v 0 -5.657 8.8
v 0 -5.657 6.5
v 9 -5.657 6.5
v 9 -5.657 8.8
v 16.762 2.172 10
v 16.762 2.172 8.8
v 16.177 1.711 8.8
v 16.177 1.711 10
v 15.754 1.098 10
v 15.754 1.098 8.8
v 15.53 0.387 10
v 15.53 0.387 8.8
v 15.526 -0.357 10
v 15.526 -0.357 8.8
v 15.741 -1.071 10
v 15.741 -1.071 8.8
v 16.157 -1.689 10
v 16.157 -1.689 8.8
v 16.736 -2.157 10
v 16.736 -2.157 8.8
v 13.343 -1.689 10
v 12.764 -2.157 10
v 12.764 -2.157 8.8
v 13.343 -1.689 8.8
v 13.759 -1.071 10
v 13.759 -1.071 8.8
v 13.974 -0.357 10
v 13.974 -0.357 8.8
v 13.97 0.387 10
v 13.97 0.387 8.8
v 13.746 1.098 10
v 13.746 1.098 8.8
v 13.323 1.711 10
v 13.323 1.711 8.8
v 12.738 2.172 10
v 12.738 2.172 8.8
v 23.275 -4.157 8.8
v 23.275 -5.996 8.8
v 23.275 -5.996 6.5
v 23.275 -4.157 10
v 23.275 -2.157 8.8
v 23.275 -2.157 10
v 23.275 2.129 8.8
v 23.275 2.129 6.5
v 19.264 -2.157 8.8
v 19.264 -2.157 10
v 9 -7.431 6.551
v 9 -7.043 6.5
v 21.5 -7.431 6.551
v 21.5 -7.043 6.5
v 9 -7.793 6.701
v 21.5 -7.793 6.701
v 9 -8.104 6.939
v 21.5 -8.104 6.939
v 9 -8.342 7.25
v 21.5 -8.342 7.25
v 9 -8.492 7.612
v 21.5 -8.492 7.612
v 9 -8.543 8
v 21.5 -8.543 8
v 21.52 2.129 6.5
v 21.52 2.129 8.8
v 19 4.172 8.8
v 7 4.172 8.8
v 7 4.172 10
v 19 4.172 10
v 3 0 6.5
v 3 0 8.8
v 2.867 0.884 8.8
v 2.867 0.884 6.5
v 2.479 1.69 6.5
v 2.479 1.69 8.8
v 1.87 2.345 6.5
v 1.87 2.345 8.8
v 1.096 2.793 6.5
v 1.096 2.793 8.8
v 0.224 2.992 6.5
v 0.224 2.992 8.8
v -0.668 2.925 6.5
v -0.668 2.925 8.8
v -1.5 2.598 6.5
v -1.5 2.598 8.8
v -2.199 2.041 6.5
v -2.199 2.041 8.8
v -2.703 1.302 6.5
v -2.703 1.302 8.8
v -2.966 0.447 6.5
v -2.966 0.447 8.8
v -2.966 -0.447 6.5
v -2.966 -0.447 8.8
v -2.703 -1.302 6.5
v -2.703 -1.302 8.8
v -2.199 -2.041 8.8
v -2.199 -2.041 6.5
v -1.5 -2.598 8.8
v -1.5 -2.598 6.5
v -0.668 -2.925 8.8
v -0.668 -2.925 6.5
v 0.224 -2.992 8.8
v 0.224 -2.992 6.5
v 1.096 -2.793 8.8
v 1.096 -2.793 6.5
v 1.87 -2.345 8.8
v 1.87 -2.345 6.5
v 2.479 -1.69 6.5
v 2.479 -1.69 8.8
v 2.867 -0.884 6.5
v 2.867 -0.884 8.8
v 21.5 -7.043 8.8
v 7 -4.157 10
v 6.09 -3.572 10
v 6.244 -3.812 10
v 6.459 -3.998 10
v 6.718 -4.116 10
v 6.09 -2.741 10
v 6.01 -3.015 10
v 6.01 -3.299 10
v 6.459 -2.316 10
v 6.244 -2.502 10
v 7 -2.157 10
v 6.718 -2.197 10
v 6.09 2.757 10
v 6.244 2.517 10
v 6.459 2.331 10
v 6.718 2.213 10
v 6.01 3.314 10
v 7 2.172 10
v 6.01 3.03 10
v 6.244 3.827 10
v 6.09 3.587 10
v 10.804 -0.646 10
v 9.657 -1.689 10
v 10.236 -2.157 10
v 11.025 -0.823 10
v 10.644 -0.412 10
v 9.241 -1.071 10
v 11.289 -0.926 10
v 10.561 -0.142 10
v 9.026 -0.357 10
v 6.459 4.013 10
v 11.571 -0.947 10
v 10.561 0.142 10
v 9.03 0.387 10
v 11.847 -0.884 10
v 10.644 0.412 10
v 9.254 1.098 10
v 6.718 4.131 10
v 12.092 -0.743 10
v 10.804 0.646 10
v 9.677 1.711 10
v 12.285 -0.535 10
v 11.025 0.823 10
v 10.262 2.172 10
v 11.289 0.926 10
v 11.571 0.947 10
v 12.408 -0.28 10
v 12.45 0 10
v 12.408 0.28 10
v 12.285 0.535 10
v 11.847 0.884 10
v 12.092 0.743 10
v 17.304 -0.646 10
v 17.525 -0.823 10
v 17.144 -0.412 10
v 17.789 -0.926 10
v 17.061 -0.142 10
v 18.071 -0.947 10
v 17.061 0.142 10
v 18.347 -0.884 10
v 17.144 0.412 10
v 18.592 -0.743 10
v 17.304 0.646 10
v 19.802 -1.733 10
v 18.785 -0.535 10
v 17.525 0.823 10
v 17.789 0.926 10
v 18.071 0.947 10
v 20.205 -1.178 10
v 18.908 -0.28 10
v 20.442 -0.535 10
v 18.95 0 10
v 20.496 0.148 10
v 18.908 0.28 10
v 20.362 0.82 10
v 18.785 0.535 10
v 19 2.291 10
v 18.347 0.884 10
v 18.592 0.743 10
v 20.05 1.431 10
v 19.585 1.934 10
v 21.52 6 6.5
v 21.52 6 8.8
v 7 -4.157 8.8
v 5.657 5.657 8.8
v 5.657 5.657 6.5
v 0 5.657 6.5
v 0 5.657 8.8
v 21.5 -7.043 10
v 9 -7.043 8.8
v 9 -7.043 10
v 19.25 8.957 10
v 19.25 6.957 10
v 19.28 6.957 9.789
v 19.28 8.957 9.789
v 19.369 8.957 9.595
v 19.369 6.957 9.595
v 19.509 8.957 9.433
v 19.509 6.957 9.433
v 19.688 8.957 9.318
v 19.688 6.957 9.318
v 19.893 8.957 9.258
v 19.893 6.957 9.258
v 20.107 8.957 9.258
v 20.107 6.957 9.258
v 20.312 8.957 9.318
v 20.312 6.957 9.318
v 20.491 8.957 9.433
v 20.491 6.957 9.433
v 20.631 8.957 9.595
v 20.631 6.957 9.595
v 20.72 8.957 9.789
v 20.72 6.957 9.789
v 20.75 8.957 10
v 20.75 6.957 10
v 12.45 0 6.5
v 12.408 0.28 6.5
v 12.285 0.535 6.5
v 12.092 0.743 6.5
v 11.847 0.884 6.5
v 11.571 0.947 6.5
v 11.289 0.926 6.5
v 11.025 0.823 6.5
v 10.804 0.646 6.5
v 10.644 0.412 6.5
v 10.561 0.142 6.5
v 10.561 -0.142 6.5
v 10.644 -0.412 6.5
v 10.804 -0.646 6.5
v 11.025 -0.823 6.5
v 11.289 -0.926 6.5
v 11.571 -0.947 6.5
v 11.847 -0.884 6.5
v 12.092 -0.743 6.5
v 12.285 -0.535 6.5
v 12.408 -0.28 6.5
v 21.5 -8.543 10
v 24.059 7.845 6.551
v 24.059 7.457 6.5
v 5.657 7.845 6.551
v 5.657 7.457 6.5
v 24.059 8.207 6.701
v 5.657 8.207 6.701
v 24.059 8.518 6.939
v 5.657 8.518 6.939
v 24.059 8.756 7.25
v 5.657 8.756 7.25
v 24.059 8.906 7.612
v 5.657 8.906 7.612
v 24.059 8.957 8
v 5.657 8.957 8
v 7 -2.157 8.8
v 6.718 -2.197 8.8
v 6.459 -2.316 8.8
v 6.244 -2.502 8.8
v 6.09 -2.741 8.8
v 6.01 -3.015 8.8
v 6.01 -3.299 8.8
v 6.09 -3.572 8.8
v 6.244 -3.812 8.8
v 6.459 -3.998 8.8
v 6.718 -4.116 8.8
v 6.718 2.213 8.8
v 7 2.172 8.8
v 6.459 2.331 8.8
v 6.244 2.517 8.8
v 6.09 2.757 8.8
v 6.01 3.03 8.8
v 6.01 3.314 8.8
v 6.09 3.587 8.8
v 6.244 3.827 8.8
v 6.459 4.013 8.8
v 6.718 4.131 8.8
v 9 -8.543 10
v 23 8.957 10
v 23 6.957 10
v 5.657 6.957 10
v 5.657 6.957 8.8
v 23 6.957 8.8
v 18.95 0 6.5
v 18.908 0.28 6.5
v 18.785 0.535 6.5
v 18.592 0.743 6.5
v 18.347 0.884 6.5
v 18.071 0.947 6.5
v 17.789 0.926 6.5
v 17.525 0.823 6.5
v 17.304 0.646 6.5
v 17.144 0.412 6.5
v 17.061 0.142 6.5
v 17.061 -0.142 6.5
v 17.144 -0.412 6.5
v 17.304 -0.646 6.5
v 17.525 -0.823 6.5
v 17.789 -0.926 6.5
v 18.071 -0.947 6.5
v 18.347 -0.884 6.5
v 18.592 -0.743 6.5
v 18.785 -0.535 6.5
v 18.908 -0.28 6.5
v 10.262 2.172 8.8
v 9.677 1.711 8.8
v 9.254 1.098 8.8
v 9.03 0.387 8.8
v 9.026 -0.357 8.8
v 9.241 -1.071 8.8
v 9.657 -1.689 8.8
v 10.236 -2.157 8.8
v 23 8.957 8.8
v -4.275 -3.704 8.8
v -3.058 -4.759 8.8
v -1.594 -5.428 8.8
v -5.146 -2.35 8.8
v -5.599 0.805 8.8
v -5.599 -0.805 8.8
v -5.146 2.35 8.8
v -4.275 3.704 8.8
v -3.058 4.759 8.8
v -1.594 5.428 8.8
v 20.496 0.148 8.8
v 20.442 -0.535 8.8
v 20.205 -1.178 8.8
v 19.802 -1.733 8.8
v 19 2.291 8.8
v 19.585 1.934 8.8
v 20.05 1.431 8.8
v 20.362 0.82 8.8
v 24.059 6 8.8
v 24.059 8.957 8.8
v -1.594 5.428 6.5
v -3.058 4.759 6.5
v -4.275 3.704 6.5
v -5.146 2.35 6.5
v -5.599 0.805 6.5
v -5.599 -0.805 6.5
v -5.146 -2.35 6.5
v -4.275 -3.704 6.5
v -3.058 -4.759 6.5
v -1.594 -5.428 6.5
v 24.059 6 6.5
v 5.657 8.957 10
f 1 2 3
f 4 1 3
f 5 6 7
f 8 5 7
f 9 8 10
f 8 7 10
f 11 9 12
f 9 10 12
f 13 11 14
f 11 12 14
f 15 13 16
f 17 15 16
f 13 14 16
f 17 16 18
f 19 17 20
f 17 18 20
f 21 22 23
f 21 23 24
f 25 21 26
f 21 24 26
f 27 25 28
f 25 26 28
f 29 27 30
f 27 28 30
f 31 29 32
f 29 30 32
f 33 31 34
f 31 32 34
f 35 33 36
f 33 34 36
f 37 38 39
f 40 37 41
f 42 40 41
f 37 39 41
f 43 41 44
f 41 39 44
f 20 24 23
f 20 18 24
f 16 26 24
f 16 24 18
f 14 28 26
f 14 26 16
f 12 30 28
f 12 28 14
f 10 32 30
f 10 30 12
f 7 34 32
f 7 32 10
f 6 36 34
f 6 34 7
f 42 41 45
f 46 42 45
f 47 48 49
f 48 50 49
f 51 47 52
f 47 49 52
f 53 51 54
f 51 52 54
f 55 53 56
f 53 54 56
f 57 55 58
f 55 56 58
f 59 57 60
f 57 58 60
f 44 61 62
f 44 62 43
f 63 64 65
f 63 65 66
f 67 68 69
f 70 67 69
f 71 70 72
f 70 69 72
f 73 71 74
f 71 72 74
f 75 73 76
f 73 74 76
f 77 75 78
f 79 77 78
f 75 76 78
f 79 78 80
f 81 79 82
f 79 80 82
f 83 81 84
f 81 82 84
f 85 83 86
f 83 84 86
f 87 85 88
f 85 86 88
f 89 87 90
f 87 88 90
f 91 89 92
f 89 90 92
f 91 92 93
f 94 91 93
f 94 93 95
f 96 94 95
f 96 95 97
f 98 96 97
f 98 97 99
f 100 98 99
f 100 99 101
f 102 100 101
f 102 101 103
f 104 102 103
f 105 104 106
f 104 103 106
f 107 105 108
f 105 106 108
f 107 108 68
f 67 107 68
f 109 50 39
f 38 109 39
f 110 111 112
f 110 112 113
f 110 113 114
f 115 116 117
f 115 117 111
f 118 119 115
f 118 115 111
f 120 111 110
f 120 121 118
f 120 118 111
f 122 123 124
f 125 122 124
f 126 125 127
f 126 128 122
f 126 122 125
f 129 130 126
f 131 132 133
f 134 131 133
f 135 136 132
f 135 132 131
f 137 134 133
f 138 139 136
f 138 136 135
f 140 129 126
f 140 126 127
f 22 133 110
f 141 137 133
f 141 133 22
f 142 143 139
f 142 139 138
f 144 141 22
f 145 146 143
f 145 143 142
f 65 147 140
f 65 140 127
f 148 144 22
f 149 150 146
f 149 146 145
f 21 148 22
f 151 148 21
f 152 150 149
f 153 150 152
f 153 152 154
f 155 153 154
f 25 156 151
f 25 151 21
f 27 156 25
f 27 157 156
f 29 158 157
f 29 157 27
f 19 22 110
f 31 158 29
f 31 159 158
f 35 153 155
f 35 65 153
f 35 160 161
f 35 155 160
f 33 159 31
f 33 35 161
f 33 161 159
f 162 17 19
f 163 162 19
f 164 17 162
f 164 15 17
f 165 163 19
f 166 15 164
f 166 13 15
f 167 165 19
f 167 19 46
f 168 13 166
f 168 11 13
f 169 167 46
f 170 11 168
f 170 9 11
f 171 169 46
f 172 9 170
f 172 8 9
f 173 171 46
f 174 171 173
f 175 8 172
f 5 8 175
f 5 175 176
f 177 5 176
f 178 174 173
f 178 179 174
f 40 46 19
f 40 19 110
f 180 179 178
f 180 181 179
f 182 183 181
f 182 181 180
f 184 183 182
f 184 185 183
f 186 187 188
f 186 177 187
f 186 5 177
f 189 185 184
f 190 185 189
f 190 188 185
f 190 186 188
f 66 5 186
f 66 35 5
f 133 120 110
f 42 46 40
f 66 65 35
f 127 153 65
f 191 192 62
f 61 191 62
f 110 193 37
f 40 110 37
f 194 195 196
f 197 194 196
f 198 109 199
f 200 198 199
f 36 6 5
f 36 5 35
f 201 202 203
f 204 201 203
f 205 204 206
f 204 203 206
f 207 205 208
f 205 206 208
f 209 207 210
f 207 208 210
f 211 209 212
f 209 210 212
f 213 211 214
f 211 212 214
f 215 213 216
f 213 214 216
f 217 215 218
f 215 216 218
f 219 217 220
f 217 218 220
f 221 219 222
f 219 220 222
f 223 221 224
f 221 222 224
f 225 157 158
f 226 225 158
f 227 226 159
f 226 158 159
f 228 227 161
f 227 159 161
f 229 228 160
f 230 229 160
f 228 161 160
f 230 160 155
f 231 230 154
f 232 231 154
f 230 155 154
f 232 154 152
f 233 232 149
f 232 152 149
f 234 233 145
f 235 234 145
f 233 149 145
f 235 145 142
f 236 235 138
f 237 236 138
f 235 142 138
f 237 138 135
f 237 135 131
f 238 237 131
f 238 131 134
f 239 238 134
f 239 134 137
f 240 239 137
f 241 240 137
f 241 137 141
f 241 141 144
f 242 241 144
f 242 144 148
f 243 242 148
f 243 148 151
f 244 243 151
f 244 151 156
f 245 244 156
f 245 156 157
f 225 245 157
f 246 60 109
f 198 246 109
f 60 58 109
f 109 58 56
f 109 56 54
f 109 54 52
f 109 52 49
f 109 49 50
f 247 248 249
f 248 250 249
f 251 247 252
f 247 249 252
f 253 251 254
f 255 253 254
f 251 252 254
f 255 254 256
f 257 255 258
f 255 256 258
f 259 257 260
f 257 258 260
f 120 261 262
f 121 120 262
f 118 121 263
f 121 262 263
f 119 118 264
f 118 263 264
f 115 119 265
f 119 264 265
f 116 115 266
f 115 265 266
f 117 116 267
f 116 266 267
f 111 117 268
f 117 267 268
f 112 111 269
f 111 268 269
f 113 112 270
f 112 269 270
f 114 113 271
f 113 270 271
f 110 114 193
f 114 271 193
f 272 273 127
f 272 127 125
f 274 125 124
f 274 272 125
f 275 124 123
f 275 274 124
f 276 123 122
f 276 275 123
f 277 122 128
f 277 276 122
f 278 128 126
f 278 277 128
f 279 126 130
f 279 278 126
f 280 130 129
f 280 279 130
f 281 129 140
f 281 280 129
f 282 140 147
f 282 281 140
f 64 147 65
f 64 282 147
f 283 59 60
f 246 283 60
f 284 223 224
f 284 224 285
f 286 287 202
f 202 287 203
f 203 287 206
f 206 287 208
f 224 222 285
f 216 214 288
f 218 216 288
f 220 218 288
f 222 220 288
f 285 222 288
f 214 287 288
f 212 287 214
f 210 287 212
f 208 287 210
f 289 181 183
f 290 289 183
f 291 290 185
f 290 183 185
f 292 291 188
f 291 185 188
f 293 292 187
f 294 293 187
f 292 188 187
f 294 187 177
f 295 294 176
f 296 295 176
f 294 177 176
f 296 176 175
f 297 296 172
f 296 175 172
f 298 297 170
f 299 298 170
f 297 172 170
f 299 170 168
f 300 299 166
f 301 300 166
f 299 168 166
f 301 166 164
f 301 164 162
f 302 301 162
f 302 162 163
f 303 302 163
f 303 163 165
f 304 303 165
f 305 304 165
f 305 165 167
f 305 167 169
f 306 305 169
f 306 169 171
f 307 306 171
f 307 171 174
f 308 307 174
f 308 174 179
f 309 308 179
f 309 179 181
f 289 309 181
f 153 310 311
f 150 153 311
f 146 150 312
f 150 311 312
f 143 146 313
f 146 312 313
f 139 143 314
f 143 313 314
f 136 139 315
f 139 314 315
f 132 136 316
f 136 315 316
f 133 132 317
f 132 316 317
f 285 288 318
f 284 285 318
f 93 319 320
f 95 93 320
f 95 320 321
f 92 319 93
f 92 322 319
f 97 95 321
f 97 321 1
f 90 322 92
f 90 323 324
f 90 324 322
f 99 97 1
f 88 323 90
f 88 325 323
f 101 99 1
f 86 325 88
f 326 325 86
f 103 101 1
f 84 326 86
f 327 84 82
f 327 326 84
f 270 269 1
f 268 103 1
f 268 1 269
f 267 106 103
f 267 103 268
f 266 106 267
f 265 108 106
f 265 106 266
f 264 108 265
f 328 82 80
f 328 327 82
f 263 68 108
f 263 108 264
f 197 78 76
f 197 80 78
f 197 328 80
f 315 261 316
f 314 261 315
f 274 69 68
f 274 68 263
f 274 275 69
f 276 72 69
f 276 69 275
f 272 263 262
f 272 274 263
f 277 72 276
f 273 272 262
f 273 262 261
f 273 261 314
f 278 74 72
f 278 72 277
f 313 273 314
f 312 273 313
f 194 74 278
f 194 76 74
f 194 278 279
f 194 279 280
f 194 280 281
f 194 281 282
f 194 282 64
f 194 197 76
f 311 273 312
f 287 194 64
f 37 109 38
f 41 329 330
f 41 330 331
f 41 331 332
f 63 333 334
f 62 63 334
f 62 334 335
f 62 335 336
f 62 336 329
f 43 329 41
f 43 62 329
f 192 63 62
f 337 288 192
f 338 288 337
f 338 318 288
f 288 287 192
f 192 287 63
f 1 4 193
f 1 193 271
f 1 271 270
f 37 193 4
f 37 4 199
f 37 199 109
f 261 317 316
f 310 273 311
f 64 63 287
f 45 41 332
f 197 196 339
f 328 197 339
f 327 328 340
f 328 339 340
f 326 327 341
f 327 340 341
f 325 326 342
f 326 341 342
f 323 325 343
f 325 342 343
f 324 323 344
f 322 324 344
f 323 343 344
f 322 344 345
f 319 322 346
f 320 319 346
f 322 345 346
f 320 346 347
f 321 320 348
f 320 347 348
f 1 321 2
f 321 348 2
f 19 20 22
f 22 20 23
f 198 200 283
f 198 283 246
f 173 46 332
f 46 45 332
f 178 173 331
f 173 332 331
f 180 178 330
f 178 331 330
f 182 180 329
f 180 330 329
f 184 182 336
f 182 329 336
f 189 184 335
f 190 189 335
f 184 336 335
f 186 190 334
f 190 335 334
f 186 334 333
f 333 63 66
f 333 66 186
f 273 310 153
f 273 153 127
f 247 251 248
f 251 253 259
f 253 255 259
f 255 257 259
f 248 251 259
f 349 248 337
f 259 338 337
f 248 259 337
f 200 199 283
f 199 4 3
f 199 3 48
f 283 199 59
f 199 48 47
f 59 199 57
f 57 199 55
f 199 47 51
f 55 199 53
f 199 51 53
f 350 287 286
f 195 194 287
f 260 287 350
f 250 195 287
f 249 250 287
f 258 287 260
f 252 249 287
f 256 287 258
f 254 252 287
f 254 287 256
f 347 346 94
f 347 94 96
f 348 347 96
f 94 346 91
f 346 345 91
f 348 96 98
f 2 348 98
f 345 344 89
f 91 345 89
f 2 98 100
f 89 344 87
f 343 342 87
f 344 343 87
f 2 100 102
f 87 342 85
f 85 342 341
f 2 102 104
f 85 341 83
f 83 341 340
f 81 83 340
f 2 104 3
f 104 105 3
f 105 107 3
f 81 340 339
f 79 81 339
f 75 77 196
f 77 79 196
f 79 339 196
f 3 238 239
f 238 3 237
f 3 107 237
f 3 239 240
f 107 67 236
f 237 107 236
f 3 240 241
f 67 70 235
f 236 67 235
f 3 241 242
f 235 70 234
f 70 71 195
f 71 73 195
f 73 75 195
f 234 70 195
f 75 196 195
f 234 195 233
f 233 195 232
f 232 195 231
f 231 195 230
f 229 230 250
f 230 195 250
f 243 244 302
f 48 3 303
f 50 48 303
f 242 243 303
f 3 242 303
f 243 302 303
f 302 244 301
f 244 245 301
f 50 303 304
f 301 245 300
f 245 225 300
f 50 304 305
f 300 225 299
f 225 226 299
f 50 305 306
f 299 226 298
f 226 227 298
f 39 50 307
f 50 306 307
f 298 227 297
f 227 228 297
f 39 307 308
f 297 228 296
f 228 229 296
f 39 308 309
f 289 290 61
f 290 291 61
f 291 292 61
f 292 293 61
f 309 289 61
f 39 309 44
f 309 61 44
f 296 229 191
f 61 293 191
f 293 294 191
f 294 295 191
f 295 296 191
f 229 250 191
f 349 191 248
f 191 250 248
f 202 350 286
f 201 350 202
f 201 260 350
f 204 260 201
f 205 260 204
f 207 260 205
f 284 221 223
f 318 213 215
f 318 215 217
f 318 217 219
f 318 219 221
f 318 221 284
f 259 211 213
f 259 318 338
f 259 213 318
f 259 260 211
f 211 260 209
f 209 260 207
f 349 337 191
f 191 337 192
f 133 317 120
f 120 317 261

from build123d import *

# Parameters (mm, degrees)
BOSS_EXTRUDE1_DEPTH  = 2
BOSS_EXTRUDE6_DEPTH  = 4.5
CUT_EXTRUDE6_DEPTH   = 4.5
BOSS_EXTRUDE14_DEPTH = 2.3
SKETCH32_R           = 3
CUT_EXTRUDE7_DEPTH   = 2.3
SKETCH33_W           = 17.343145750507624
SKETCH33_H           = 2
BOSS_EXTRUDE15_DEPTH = 1.2
CUT_EXTRUDE8_DEPTH   = 2.4
CUT_EXTRUDE9_DEPTH   = 4.3999999999999995
SKETCH37_R           = 3.899999999999994
BOSS_EXTRUDE16_DEPTH = 4.4
CUT_EXTRUDE10_DEPTH  = 39.60291748102272
SKETCH43_R           = 2.5000000000000004
SKETCH43_R_2         = 2.4999999999999982
BOSS_EXTRUDE17_DEPTH = 1.2
SKETCH44_R           = 0.9499999999999992
SKETCH44_R_2         = 0.9500000000000008
CUT_EXTRUDE11_DEPTH  = 40.360198653546576
SKETCH45_R           = 1.9999999999999996
SKETCH45_R_2         = 2.000000000000003
CUT_EXTRUDE12_DEPTH  = 4.5
SKETCH49_R           = 0.7500000000000021
CUT_EXTRUDE13_DEPTH  = 3
CUT_EXTRUDE14_DEPTH  = 6.8
FILLET1_R            = 1.5
FILLET3_R            = 1


with BuildPart() as part:
    # Sketch3 → Boss-Extrude1 (new body)
    with BuildSketch(Plane.XY):
        with BuildLine():
            Line((8.000000000000002, 0), (8.999999999999993, -2.5431457505076343))
            Line((8.999999999999993, -2.5431457505076343), (8.999999999999993, -7.04314575050762))
            Line((8.999999999999993, -7.04314575050762), (21.50000000000003, -7.043145750507617))
            Line((21.50000000000003, -7.043145750507617), (25.05025253169419, -4.949747468305846))
            ThreePointArc((25.05025253169419, -4.949747468305846), (36.46715672757901, -2.678784026555599), (30, 7.000000000000014))
            Line((30, 7.000000000000014), (26.999999999999996, 7.456854249492377))
            Line((26.999999999999996, 7.456854249492377), (5.656854249492369, 7.456854249492377))
            Line((5.656854249492369, 7.456854249492377), (5.656854249492376, 5.656854249492382))
            ThreePointArc((5.656854249492376, 5.656854249492382), (7.391036260090296, 3.061467458920721), (8.000000000000002, 0))
        make_face()
    extrude(amount=BOSS_EXTRUDE1_DEPTH)

    # Sketch22 → Boss-Extrude6 (add)
    with BuildSketch(Plane.XY.offset(2)):
        with BuildLine():
            Line((5.656854249492376, 7.456854249492377), (21.50000000000004, 7.456854249492377))
            Line((21.50000000000004, 7.456854249492377), (26.999999999999996, 7.456854249492377))
            Line((26.999999999999996, 7.456854249492377), (26.999999999999996, 2.1288604946885763))
            Line((26.999999999999996, 2.1288604946885763), (23.27512626584711, 2.128860494688576))
            Line((23.27512626584711, 2.128860494688576), (23.27512626584711, -5.996446609406731))
            Line((23.27512626584711, -5.996446609406731), (21.50000000000003, -7.043145750507617))
            Line((21.50000000000003, -7.043145750507617), (8.999999999999993, -7.04314575050762))
            Line((8.999999999999993, -7.04314575050762), (8.999999999999993, -2.5431457505076343))
            Line((8.999999999999993, -2.5431457505076343), (7.999999999999998, 0))
            ThreePointArc((7.999999999999998, 0), (7.391036260090291, 3.061467458920719), (5.656854249492376, 5.656854249492382))
            Line((5.656854249492376, 5.656854249492382), (5.656854249492376, 7.456854249492377))
        make_face()
    extrude(amount=BOSS_EXTRUDE6_DEPTH)

    # Sketch26 → Cut-Extrude6 (cut)
    with BuildSketch(Plane.XY.offset(2)):
        Polygon((18.098080447707712, 5.299999999999999), (2.5300524575164793, 5.299999999999999), (2.5300524575164793, 4), (18.098080447707712, 4), (26.999999999999996, 4), (26.999999999999996, 5.299999999999999), align=None)
    extrude(amount=CUT_EXTRUDE6_DEPTH, mode=Mode.SUBTRACT)


with BuildPart() as body_2:
    # Sketch31 → Boss-Extrude14 (new body)
    with BuildSketch(Plane.XY.offset(6.5)):
        with BuildLine():
            Line((2.4326880657739025, 5.656854249492382), (0, 5.656854249492382))
            ThreePointArc((0, 5.656854249492382), (-5.656854249492382, 6.9e-16), (0, -5.656854249492382))
            Line((0, -5.656854249492382), (9.000000000000004, -5.656854249492382))
            Line((9.000000000000004, -5.656854249492382), (8.999999999999993, -7.04314575050762))
            Line((8.999999999999993, -7.04314575050762), (8.999999999999993, -8.54314575050762))
            Line((8.999999999999993, -8.54314575050762), (21.50000000000003, -8.54314575050762))
            Line((21.50000000000003, -8.54314575050762), (21.50000000000003, -7.043145750507617))
            Line((21.50000000000003, -7.043145750507617), (23.27512626584711, -5.996446609406731))
            Line((23.27512626584711, -5.996446609406731), (23.27512626584711, 2.128860494688576))
            Line((23.27512626584711, 2.128860494688576), (26.999999999999996, 2.1288604946885763))
            Line((26.999999999999996, 2.1288604946885763), (26.999999999999996, 7.456854249492377))
            Line((26.999999999999996, 7.456854249492377), (26.999999999999996, 8.956854249492377))
            Line((26.999999999999996, 8.956854249492377), (5.656854249492376, 8.956854249492377))
            Line((5.656854249492376, 8.956854249492377), (5.656854249492376, 7.456854249492377))
            Line((5.656854249492376, 7.456854249492377), (5.656854249492376, 5.656854249492382))
            Line((5.656854249492376, 5.656854249492382), (2.4326880657739025, 5.656854249492382))
        make_face()
    extrude(amount=BOSS_EXTRUDE14_DEPTH)

    # Sketch32 → Cut-Extrude7 (cut)
    with BuildSketch(Plane.XY.offset(8.799999999999999)):
        Circle(SKETCH32_R)
    extrude(amount=-CUT_EXTRUDE7_DEPTH, mode=Mode.SUBTRACT)

    # Sketch33 → Boss-Extrude15 (add)
    with BuildSketch(Plane.XY.offset(8.799999999999999)):
        with Locations((14.328427124746185, 7.956854249492377)):
            Rectangle(SKETCH33_W, SKETCH33_H)
        Polygon((9.000000000000004, -7.043145750507619), (9.000000000000004, -8.54314575050762), (21.50000000000003, -8.54314575050762), (21.50000000000003, -7.043145750507617), align=None)
        with BuildLine():
            Line((7.000000000000003, -4.156854249492383), (23.275126265847117, -4.156854249492383))
            Line((23.275126265847117, -4.156854249492383), (23.275126265847113, -2.1568542494923815))
            Line((23.275126265847113, -2.1568542494923815), (7.000000000000003, -2.1568542494923832))
            ThreePointArc((7.000000000000003, -2.1568542494923832), (6.000000000000003, -3.1568542494923832), (7.000000000000003, -4.156854249492383))
        make_face()
        with BuildLine():
            Line((18.999999999999996, 2.172006245196199), (7.000000000000003, 2.172006245196201))
            ThreePointArc((7.000000000000003, 2.172006245196201), (6.0000000000000036, 3.1720062451962), (7.000000000000003, 4.172006245196199))
            Line((7.000000000000003, 4.172006245196199), (18.999999999999996, 4.172006245196199))
            Line((18.999999999999996, 4.172006245196199), (18.999999999999996, 2.172006245196199))
        make_face()
    extrude(amount=BOSS_EXTRUDE15_DEPTH)


with BuildPart() as cut_extrude8_tool:
    # Sketch35 → Cut-Extrude8 (new body)
    with BuildSketch(Plane.XY.offset(8.799999999999999)):
        Polygon((26.999999999999996, 2.1288604946885763), (26.999999999999996, 6.000000000000002), (21.520354003499165, 6.000000000000002), (21.520354003499165, 2.1288604946885754), align=None)
    extrude(amount=-CUT_EXTRUDE8_DEPTH)


with BuildPart() as part_1:
    add(part.part)

    # Cut-Extrude8: cut by cut_extrude8_tool
    add(cut_extrude8_tool.part, mode=Mode.SUBTRACT)

    # Sketch36 → Cut-Extrude9 (cut)
    with BuildSketch(Plane.XY.offset(6.3999999999999995)):
        Polygon((26.999999999999996, 2.1288604946885763), (26.999999999999996, 4), (23.30000000000004, 3.999999999999999), (23.30000000000003, 2.1288604946885754), align=None)
    extrude(amount=-CUT_EXTRUDE9_DEPTH, mode=Mode.SUBTRACT)

    # Sketch37 → Boss-Extrude16 (add)
    with BuildSketch(Plane.XY.offset(2)):
        with Locations((29.999999999999996, 1.388e-14)):
            Circle(SKETCH37_R)
    extrude(amount=BOSS_EXTRUDE16_DEPTH)

    # Sketch39 → Cut-Extrude10 (cut, through all)
    with BuildSketch(Plane.XY.offset(6.4)):
        with BuildLine():
            Line((28.999999999999993, 0.9797958971132569), (28.999999999999993, -0.9797958971132569))
            ThreePointArc((28.999999999999993, -0.9797958971132569), (31.4, 2.383e-14), (28.999999999999993, 0.9797958971132569))
        make_face()
    extrude(amount=-CUT_EXTRUDE10_DEPTH, mode=Mode.SUBTRACT)


with BuildPart() as body_2_1:
    add(body_2.part)

    # Cut-Extrude8: cut by cut_extrude8_tool
    add(cut_extrude8_tool.part, mode=Mode.SUBTRACT)

    # Sketch43 → Boss-Extrude17 (add)
    with BuildSketch(Plane.XY.offset(8.799999999999999)):
        with Locations((11.500000000000004, 0)):
            Circle(SKETCH43_R)
        with Locations((18.000000000000004, 0)):
            Circle(SKETCH43_R_2)
    extrude(amount=BOSS_EXTRUDE17_DEPTH)


with BuildPart() as cut_extrude11_tool:
    # Sketch44 → Cut-Extrude11 (new, through all)
    with BuildSketch(Plane.XY.offset(9.999999999999998)):
        with Locations((11.500000000000004, 0)):
            Circle(SKETCH44_R)
        with Locations((18.000000000000004, 0)):
            Circle(SKETCH44_R_2)
    extrude(amount=-CUT_EXTRUDE11_DEPTH)


with BuildPart() as part_2:
    add(part_1.part)

    # Cut-Extrude11: cut by cut_extrude11_tool
    add(cut_extrude11_tool.part, mode=Mode.SUBTRACT)

    # Sketch45 → Cut-Extrude12 (cut)
    with BuildSketch(Plane(origin=(0, 0, 0), x_dir=(-1, 0, 0), z_dir=(0, 0, -1))):
        with Locations((-11.500000000000004, 0)):
            Circle(SKETCH45_R)
        with Locations((-18.000000000000004, 0)):
            Circle(SKETCH45_R_2)
    extrude(amount=-CUT_EXTRUDE12_DEPTH, mode=Mode.SUBTRACT)


with BuildPart() as body_2_2:
    add(body_2_1.part)

    # Cut-Extrude11: cut by cut_extrude11_tool
    add(cut_extrude11_tool.part, mode=Mode.SUBTRACT)

    # Sketch49 → Cut-Extrude13 (cut)
    with BuildSketch(Plane.XZ.offset(-6.956854249492377)):
        with Locations((19.999999999999996, 9.999999999999998)):
            Circle(SKETCH49_R)
    extrude(amount=-CUT_EXTRUDE13_DEPTH, mode=Mode.SUBTRACT)


with BuildPart() as cut_extrude14_tool:
    # Sketch51 → Cut-Extrude14 (new body)
    with BuildSketch(Plane.XY.offset(8.799999999999999)):
        Polygon((27, 8.956854249492377), (24.058650564533934, 8.956854249492377), (24.058650564533938, 4.991269007681976), (26.999999999999996, 4.991269007681976), align=None)
    extrude(amount=-CUT_EXTRUDE14_DEPTH)


with BuildPart() as part_3:
    add(part_2.part)

    # Cut-Extrude14: cut by cut_extrude14_tool
    add(cut_extrude14_tool.part, mode=Mode.SUBTRACT)

    # Fillet3
    fillet3_edges = [part_3.edges().sort_by_distance(p)[0] for p in [
        (23.27512626584711, -5.996446609406731, 4.25),
        (24.058650564533934, 7.456854249492377, 4.25),
        (8.999999999999993, -7.04314575050762, 3.25),
        (5.656854249492373, 7.456854249492377, 3.25),
        (15.25000000000001, -7.043145750507618, 0),
        (16.328427124746185, 7.456854249492377, 0),
    ]]
    fillet(fillet3_edges, radius=FILLET3_R)


with BuildPart() as body_2_3:
    add(body_2_2.part)

    # Cut-Extrude14: cut by cut_extrude14_tool
    add(cut_extrude14_tool.part, mode=Mode.SUBTRACT)

    # Fillet1
    fillet1_edges = [body_2_3.edges().sort_by_distance(p)[0] for p in [
        (14.857752407013155, 8.956854249492377, 6.5),
        (15.25000000000001, -8.54314575050762, 6.5),
    ]]
    fillet(fillet1_edges, radius=FILLET1_R)


solid = body_2_3.part
